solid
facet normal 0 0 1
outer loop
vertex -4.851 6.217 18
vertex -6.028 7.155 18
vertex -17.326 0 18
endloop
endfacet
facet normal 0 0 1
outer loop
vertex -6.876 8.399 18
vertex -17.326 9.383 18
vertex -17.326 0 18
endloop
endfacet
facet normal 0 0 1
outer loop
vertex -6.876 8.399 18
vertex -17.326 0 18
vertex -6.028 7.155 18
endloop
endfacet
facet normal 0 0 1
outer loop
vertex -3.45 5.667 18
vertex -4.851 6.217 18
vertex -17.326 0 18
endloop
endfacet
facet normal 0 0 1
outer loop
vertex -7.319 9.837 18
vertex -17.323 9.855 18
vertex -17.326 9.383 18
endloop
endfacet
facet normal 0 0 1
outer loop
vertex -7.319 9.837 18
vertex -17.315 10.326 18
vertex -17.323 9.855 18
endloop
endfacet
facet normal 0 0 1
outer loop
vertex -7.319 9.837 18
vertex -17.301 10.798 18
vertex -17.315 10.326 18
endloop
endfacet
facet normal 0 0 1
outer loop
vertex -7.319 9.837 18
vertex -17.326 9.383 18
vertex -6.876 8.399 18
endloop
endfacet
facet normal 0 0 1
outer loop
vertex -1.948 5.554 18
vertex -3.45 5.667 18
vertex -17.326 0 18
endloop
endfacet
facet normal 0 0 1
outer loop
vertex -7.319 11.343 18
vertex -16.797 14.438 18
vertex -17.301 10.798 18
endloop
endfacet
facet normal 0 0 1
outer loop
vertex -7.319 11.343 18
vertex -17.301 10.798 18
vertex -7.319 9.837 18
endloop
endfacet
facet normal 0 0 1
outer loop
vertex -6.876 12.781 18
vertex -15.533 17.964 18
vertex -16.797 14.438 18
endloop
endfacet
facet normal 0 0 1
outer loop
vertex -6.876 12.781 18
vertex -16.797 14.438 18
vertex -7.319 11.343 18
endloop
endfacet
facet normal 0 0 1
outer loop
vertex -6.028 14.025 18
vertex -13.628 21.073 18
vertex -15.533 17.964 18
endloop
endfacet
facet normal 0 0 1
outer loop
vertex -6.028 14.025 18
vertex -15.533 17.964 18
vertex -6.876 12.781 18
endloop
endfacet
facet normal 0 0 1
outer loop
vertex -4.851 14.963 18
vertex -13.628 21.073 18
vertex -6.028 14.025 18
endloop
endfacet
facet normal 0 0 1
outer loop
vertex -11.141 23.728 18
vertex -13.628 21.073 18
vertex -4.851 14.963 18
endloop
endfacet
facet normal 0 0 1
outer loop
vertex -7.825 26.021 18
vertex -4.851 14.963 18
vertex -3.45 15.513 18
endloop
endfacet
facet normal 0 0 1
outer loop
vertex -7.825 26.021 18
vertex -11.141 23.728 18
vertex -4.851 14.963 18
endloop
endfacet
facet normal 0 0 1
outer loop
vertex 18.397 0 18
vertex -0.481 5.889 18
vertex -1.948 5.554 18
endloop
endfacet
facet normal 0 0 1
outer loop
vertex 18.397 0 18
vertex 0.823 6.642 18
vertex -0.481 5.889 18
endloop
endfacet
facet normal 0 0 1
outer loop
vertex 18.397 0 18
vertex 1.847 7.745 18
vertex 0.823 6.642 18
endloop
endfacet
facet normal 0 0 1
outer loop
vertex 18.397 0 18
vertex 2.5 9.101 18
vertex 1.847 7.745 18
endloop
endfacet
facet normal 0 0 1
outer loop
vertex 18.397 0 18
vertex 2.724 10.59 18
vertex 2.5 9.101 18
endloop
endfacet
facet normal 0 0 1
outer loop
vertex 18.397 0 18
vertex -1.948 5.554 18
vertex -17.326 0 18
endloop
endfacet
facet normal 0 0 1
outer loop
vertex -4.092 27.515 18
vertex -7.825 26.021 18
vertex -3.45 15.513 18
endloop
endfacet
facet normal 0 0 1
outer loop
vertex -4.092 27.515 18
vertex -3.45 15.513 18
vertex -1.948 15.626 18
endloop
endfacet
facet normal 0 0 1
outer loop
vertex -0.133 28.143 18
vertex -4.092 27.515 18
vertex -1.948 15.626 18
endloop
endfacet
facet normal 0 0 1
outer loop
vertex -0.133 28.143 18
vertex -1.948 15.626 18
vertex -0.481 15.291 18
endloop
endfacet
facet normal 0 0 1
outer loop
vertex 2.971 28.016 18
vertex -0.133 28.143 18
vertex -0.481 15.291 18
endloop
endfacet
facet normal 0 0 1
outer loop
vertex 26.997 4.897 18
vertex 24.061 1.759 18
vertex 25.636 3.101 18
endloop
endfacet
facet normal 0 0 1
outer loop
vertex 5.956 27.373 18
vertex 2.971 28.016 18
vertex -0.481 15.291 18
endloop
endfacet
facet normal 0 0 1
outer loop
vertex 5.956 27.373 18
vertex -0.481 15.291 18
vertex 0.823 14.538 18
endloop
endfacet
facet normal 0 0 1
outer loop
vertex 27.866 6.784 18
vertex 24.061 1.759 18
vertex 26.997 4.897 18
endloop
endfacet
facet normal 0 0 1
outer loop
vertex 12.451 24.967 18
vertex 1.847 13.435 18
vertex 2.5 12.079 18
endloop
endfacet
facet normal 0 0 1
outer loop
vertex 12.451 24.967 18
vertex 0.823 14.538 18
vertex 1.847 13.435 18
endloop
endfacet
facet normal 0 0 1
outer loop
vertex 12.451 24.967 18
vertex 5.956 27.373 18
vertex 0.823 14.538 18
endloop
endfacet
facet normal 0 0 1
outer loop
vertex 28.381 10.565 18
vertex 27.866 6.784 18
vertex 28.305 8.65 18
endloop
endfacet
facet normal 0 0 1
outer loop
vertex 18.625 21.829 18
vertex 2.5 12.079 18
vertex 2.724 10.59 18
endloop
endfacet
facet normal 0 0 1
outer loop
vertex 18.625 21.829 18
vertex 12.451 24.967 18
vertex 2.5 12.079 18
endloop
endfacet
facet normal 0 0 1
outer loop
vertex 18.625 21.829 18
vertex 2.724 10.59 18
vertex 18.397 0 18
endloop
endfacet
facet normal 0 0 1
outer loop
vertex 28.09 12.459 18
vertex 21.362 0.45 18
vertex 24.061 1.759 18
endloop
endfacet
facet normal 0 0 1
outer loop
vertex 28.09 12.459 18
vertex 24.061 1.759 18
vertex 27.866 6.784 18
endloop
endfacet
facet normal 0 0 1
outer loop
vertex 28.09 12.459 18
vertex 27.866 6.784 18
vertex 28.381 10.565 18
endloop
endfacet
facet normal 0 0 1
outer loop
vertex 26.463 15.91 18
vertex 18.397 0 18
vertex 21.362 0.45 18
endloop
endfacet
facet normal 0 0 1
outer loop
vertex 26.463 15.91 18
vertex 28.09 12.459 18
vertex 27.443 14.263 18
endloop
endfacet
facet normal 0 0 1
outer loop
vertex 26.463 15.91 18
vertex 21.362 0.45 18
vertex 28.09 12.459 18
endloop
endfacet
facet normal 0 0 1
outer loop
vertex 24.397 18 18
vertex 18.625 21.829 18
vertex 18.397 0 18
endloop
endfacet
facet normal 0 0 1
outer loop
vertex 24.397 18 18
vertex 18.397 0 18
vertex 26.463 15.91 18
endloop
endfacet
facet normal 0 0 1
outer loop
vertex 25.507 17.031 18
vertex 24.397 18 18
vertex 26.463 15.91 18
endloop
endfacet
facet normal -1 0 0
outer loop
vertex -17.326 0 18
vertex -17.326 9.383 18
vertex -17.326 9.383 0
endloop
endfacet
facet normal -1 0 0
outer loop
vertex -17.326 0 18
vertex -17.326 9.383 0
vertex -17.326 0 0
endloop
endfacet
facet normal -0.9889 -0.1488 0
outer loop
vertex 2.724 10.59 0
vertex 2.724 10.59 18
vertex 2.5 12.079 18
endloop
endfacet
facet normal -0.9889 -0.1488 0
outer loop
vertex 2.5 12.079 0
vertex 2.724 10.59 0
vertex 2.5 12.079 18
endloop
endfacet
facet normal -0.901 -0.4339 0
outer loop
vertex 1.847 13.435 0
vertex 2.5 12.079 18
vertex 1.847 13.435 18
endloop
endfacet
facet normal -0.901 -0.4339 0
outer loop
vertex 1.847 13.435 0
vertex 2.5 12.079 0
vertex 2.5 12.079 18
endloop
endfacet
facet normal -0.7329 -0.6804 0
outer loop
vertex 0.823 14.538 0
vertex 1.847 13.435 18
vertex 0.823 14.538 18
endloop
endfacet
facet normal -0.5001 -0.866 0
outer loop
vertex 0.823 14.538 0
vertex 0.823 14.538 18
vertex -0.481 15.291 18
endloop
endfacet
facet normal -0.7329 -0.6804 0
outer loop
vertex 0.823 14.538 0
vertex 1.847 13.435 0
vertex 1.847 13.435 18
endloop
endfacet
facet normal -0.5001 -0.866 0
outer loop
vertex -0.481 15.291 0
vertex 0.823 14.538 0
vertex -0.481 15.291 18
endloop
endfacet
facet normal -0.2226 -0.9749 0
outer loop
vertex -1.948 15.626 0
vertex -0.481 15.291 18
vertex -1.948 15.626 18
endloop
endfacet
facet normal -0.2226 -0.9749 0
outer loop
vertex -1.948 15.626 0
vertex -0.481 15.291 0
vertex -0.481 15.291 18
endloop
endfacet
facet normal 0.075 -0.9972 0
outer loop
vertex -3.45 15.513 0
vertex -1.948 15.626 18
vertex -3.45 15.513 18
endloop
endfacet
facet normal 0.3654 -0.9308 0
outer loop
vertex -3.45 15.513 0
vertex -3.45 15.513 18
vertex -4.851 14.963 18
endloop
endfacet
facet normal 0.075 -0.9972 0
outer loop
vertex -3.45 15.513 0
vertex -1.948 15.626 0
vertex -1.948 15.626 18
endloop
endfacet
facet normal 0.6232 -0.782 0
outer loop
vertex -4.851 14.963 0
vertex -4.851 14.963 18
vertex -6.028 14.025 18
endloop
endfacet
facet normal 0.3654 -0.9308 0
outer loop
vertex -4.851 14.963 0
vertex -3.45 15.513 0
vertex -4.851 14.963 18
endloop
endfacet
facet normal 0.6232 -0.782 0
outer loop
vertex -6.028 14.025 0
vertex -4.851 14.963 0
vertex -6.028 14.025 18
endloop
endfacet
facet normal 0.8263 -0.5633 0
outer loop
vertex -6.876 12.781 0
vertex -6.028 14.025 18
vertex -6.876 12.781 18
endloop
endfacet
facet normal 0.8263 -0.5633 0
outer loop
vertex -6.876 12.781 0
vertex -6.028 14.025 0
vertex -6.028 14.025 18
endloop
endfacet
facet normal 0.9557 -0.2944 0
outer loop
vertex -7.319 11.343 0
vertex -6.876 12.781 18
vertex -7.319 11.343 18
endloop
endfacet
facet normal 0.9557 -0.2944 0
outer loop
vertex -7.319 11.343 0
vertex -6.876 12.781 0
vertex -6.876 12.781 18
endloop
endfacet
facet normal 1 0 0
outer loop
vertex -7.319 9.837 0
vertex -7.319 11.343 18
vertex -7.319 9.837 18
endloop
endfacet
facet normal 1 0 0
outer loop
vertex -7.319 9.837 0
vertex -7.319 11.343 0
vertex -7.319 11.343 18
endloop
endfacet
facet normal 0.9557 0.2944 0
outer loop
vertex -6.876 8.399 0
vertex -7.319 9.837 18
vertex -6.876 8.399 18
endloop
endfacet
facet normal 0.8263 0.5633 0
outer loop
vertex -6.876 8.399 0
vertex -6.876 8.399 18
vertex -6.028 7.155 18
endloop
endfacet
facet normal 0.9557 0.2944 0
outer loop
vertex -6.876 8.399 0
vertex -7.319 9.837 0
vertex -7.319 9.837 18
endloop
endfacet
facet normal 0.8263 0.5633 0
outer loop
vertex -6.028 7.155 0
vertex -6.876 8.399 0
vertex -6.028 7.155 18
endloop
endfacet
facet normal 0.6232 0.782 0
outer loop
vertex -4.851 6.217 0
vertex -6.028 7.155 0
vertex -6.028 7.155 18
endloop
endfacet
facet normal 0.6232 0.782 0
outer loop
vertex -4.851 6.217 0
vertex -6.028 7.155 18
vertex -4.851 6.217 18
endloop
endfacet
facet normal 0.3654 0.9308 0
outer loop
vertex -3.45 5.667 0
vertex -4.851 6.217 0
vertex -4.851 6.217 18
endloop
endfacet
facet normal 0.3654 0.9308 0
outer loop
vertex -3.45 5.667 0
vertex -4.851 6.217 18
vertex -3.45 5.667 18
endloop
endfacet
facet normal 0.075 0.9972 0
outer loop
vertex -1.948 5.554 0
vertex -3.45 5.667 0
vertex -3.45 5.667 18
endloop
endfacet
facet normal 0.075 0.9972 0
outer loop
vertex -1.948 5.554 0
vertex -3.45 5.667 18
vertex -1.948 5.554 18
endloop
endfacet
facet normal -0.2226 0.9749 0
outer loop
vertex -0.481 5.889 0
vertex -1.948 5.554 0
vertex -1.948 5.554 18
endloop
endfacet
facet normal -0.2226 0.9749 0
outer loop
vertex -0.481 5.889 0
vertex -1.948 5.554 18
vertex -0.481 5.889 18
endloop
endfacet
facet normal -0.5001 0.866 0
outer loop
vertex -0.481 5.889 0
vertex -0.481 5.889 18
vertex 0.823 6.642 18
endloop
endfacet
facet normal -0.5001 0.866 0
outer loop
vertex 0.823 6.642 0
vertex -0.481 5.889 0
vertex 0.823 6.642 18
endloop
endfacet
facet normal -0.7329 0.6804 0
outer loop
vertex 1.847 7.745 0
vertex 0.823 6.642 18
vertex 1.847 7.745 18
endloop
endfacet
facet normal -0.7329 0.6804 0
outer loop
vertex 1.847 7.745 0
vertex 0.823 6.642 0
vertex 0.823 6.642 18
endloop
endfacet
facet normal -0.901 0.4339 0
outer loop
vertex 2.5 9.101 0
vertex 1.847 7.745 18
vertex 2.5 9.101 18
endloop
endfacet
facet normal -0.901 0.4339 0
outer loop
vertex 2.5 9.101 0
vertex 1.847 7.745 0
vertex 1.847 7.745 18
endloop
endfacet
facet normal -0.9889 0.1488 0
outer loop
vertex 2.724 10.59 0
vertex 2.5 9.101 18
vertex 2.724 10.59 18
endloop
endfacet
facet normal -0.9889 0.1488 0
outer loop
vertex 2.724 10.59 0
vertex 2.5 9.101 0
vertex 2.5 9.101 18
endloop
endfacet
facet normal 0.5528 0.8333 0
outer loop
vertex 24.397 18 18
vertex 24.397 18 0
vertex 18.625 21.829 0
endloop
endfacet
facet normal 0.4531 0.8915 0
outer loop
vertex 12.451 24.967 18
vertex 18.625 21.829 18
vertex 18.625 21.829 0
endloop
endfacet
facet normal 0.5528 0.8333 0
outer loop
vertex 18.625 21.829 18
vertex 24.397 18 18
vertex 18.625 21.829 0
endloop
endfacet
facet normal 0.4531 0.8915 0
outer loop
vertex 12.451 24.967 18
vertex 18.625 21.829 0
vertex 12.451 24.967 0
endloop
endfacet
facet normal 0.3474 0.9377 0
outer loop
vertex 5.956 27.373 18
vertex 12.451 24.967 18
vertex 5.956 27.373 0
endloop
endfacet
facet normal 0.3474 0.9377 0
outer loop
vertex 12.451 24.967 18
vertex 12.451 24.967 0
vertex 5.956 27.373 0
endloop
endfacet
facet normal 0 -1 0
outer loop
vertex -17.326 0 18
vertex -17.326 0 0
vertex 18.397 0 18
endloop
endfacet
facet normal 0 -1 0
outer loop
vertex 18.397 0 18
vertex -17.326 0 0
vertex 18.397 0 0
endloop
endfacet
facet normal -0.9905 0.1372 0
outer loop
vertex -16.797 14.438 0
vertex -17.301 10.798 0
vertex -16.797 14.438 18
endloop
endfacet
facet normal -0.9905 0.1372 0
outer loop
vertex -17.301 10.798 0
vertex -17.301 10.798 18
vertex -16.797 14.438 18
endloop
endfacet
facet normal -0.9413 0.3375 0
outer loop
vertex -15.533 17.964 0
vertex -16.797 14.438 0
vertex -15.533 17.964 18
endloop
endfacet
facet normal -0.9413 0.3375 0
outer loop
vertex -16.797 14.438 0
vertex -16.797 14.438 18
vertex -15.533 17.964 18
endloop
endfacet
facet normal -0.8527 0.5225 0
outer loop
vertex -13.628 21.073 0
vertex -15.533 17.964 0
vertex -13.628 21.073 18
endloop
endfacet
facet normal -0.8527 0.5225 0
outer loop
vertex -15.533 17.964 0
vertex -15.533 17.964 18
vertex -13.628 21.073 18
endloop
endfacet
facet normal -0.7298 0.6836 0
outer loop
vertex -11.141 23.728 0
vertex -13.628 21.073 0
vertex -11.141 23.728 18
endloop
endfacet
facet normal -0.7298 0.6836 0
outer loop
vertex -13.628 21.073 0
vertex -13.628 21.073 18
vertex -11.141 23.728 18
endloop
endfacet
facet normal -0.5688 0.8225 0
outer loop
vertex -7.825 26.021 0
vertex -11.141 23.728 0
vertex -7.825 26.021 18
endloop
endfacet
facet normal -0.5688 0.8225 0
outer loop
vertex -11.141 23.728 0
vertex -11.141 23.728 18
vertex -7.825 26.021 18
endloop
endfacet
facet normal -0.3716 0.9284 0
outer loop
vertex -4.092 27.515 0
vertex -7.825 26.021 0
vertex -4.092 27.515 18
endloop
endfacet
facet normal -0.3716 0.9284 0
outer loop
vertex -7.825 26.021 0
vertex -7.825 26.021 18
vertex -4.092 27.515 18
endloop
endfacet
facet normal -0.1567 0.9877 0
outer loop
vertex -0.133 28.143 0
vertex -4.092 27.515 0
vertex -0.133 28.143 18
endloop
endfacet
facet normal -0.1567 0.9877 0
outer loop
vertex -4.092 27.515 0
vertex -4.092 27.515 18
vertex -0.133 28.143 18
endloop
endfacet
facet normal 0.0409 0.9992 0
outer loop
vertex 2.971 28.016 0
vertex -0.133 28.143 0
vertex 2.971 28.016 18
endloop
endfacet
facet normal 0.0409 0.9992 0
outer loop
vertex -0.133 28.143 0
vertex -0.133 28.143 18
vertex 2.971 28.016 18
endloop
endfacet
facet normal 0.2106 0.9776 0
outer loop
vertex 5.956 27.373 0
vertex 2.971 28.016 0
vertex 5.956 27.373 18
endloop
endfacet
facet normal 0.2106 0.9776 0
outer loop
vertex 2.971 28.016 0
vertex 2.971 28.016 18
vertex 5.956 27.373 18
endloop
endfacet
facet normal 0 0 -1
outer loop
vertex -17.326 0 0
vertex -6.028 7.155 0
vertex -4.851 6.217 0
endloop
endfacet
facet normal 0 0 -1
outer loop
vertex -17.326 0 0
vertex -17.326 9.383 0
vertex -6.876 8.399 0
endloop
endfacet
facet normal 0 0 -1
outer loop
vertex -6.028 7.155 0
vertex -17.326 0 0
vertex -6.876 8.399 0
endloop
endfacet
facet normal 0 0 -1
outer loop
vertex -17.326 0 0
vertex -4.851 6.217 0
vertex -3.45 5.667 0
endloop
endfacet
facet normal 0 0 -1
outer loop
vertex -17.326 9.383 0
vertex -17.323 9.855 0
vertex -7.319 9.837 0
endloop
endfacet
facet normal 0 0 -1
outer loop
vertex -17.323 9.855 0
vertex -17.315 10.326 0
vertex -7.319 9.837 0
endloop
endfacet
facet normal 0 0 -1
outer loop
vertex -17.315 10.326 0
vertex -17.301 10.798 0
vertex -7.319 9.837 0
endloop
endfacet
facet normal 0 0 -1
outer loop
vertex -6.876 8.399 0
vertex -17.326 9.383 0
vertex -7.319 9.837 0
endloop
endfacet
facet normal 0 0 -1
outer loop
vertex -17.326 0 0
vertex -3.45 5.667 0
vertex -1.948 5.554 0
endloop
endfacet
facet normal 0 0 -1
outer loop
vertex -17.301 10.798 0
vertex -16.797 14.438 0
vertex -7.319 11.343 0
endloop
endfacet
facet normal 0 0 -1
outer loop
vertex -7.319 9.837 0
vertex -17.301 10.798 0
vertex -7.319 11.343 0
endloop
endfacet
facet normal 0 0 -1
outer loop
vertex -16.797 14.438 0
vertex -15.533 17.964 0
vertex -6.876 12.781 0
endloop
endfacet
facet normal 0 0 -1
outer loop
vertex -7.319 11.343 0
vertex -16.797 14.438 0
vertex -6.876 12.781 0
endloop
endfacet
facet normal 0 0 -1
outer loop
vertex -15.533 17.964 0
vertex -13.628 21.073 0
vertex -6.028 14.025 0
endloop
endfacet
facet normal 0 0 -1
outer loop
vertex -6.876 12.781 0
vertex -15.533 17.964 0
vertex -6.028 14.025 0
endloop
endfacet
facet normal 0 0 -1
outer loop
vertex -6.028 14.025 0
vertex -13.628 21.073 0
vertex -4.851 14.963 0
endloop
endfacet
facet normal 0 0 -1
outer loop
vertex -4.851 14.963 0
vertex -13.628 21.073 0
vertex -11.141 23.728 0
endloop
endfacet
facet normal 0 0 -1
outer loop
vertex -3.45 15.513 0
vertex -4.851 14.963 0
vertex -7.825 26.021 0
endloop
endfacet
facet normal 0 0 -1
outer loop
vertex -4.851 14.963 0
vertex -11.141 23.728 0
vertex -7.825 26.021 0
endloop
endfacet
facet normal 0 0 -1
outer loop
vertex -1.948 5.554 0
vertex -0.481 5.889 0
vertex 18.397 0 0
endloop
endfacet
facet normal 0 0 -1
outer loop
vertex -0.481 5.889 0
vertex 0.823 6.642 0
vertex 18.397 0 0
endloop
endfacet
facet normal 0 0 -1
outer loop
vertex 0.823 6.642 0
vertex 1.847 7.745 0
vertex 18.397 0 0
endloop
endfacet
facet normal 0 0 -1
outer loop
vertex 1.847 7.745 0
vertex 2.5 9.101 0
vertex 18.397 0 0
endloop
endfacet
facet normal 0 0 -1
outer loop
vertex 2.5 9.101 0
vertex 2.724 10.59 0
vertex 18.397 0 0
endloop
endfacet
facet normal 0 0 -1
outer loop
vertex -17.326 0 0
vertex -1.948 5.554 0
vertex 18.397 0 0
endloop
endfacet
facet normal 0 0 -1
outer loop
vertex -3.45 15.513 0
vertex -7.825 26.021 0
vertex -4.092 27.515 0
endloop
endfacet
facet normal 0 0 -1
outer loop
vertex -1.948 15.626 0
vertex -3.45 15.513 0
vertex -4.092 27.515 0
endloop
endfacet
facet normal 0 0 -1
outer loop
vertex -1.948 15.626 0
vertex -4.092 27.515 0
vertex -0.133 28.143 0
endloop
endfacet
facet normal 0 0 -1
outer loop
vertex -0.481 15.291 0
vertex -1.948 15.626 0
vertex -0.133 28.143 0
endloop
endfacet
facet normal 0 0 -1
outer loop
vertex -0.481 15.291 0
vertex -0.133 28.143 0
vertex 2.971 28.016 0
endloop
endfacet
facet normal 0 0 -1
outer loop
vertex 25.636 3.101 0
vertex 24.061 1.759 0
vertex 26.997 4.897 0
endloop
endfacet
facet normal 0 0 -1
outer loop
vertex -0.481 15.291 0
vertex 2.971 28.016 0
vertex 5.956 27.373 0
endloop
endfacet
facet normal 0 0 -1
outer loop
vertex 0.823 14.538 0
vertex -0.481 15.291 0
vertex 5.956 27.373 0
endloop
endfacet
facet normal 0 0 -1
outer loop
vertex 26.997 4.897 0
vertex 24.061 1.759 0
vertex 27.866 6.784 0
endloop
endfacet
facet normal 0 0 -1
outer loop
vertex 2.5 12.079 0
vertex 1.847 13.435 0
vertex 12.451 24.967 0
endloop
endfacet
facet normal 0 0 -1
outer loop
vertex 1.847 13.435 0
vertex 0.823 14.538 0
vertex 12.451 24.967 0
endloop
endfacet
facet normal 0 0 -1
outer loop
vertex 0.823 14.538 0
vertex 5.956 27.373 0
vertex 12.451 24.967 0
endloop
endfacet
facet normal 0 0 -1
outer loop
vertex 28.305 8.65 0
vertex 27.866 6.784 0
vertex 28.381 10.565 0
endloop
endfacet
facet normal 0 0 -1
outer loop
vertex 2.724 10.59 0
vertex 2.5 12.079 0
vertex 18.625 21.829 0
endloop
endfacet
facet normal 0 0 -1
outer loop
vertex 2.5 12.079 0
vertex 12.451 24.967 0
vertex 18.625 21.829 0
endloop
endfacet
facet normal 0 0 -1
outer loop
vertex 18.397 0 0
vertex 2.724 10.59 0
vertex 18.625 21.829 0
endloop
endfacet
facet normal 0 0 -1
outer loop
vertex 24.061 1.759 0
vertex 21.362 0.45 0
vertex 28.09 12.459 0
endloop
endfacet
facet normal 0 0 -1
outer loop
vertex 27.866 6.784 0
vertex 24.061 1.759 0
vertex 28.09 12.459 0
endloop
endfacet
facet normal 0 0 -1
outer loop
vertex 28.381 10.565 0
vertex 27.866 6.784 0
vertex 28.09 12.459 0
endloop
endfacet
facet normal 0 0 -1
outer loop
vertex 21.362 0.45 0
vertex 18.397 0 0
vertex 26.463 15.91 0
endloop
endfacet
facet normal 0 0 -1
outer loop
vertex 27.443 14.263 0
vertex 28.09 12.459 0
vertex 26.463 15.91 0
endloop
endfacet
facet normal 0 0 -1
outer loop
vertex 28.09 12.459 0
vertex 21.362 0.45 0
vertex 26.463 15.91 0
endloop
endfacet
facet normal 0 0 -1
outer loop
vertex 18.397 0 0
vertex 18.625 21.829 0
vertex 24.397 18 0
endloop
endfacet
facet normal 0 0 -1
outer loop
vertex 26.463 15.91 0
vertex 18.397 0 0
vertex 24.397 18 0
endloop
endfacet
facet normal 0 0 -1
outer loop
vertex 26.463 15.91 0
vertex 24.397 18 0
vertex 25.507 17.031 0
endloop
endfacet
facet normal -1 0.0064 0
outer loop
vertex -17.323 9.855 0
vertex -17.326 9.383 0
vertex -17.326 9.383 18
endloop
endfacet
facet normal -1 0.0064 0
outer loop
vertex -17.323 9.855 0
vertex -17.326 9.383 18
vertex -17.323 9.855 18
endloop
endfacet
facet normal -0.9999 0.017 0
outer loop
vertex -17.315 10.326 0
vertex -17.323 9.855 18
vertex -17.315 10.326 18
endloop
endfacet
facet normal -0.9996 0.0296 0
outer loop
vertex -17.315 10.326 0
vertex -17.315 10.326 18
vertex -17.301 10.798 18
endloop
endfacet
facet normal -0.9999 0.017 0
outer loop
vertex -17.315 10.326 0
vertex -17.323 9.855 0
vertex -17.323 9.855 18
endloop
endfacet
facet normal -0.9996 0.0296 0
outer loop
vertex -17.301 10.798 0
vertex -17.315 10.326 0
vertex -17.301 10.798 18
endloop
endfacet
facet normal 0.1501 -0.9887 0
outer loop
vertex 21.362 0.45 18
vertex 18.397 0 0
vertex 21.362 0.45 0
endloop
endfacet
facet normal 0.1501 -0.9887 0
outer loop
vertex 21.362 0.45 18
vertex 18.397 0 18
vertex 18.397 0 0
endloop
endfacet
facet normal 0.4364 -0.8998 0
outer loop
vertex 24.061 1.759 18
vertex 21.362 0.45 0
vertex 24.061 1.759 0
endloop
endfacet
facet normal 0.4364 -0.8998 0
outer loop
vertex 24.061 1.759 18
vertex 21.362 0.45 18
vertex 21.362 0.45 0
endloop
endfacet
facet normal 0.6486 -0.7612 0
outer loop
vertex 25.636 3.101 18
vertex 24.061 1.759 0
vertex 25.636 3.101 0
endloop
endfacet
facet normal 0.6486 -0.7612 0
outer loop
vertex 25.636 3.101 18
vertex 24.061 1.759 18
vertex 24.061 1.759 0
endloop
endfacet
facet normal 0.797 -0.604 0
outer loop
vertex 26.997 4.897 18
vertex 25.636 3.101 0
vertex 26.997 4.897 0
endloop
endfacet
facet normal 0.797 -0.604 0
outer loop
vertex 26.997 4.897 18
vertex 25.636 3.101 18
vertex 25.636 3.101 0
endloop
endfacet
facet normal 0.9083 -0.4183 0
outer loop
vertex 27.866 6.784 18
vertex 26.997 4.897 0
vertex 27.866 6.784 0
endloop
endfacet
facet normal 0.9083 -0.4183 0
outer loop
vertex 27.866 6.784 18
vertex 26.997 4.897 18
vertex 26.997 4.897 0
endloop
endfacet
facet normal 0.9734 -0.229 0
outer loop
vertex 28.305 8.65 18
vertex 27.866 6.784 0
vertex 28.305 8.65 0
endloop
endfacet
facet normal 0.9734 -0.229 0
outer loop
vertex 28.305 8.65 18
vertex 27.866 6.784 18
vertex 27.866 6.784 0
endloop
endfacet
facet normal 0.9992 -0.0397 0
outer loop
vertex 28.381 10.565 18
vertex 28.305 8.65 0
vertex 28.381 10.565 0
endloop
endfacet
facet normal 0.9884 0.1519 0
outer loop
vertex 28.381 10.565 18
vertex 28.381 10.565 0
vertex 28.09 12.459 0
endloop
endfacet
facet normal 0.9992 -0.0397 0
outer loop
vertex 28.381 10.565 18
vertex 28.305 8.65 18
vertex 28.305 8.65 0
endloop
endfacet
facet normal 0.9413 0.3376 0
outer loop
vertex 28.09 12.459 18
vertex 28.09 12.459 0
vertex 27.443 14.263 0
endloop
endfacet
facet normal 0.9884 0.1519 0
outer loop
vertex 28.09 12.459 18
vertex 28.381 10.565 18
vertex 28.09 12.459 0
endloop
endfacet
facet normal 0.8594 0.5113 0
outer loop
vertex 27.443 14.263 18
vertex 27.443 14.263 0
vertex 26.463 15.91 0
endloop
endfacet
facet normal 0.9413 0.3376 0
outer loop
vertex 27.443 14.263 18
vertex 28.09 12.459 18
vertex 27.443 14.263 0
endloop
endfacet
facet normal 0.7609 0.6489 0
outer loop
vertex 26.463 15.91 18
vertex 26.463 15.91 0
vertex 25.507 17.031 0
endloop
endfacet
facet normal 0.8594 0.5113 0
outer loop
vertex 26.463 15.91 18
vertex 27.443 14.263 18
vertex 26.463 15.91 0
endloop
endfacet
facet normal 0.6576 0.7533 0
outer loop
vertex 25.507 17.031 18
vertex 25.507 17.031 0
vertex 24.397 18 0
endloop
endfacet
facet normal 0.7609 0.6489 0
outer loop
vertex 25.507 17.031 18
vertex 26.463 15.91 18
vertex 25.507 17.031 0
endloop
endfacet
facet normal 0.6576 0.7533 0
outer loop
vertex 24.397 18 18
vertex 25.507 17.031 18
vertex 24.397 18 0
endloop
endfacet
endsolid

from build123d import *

# Parameters (mm, degrees)
F0_R        = 5.05
F1_DEPTH    = 18
F2_R        = 10
F3_T1_DEPTH = 139.38722981
F4_R        = 9.99999
F5_T1_DEPTH = 121.084516093
F6_R        = 18


# Not quite as in the source:
# - a fillet or chamfer that OpenCascade refuses, or shapes differently, is made with other operations: its cross-section is extruded or revolved along the edge and cut away or added
# - a fillet or chamfer is up to 0.001 mm smaller than in the source, because OpenCascade refuses the exact size


with BuildPart() as f1:
    # F0 (on Top) → F1 (new body)
    with BuildSketch(Plane.XY):
        Polygon((-17.3258748727, 30), (-17.3258748727, 0), (42.6741251273, 0), (12.6741251273, 30), align=None)
        with Locations((-2.3258748727, 10.59)):
            Circle(F0_R, mode=Mode.SUBTRACT)
    extrude(amount=F1_DEPTH)

    # F2
    f2_edges = [f1.edges().sort_by_distance(p)[0] for p in [
        (42.674125, 0, 9),
    ]]
    fillet(f2_edges, radius=F2_R)

    # F3: fillet of radius 60 on 1 edges, made by hand

    # F3_s2 → F3_t1 (cut)
    with BuildSketch(Plane.XY.offset(-60.693614905)):
        with BuildLine():
            ThreePointArc((25.6030573154, 17.0710678119), (8.0910429692, 26.6756740971), (-11.6033208347, 30))
            Line((-11.6033208347, 30), (-11.6033208347, 31.2))
            Line((-11.6033208347, 31.2), (12.6741251273, 31.2))
            Line((12.6741251273, 31.2), (13.5226532647, 30.8485281374))
            ThreePointArc((13.5226532647, 30.8485281374), (19.9871193587, 24.3840620434), (26.3471848784, 18.0124891681))
            Line((26.3471848784, 18.0124891681), (25.6030573154, 17.0710678119))
        make_face()
    extrude(amount=F3_T1_DEPTH, mode=Mode.SUBTRACT)

    # F4 (radius 10 in the source; OpenCascade refuses exactly that, so slightly less here)
    f4_edges = [f1.edges().sort_by_distance(p)[0] for p in [
        (25.603057, 17.071068, 9),
    ]]
    fillet(f4_edges, radius=F4_R)

    # F5: fillet of radius 40 on 1 edges, made by hand

    # F5_s2 → F5_t1 (cut)
    with BuildSketch(Plane.XY.offset(-51.5422580465)):
        with BuildLine():
            ThreePointArc((-17.3258748727, 9.3830967814), (-15.8686941682, 20.0812779708), (-11.6033208347, 30))
            Line((-11.6033208347, 30), (-17.3258748727, 30))
            Line((-17.3258748727, 30), (-17.3258748727, 9.3830967814))
        make_face()
    extrude(amount=F5_T1_DEPTH, mode=Mode.SUBTRACT)

    # F6
    f6_edges = [f1.edges().sort_by_distance(p)[0] for p in [
        (-11.603321, 30, 9),
    ]]
    fillet(f6_edges, radius=F6_R)


solid = f1.part
